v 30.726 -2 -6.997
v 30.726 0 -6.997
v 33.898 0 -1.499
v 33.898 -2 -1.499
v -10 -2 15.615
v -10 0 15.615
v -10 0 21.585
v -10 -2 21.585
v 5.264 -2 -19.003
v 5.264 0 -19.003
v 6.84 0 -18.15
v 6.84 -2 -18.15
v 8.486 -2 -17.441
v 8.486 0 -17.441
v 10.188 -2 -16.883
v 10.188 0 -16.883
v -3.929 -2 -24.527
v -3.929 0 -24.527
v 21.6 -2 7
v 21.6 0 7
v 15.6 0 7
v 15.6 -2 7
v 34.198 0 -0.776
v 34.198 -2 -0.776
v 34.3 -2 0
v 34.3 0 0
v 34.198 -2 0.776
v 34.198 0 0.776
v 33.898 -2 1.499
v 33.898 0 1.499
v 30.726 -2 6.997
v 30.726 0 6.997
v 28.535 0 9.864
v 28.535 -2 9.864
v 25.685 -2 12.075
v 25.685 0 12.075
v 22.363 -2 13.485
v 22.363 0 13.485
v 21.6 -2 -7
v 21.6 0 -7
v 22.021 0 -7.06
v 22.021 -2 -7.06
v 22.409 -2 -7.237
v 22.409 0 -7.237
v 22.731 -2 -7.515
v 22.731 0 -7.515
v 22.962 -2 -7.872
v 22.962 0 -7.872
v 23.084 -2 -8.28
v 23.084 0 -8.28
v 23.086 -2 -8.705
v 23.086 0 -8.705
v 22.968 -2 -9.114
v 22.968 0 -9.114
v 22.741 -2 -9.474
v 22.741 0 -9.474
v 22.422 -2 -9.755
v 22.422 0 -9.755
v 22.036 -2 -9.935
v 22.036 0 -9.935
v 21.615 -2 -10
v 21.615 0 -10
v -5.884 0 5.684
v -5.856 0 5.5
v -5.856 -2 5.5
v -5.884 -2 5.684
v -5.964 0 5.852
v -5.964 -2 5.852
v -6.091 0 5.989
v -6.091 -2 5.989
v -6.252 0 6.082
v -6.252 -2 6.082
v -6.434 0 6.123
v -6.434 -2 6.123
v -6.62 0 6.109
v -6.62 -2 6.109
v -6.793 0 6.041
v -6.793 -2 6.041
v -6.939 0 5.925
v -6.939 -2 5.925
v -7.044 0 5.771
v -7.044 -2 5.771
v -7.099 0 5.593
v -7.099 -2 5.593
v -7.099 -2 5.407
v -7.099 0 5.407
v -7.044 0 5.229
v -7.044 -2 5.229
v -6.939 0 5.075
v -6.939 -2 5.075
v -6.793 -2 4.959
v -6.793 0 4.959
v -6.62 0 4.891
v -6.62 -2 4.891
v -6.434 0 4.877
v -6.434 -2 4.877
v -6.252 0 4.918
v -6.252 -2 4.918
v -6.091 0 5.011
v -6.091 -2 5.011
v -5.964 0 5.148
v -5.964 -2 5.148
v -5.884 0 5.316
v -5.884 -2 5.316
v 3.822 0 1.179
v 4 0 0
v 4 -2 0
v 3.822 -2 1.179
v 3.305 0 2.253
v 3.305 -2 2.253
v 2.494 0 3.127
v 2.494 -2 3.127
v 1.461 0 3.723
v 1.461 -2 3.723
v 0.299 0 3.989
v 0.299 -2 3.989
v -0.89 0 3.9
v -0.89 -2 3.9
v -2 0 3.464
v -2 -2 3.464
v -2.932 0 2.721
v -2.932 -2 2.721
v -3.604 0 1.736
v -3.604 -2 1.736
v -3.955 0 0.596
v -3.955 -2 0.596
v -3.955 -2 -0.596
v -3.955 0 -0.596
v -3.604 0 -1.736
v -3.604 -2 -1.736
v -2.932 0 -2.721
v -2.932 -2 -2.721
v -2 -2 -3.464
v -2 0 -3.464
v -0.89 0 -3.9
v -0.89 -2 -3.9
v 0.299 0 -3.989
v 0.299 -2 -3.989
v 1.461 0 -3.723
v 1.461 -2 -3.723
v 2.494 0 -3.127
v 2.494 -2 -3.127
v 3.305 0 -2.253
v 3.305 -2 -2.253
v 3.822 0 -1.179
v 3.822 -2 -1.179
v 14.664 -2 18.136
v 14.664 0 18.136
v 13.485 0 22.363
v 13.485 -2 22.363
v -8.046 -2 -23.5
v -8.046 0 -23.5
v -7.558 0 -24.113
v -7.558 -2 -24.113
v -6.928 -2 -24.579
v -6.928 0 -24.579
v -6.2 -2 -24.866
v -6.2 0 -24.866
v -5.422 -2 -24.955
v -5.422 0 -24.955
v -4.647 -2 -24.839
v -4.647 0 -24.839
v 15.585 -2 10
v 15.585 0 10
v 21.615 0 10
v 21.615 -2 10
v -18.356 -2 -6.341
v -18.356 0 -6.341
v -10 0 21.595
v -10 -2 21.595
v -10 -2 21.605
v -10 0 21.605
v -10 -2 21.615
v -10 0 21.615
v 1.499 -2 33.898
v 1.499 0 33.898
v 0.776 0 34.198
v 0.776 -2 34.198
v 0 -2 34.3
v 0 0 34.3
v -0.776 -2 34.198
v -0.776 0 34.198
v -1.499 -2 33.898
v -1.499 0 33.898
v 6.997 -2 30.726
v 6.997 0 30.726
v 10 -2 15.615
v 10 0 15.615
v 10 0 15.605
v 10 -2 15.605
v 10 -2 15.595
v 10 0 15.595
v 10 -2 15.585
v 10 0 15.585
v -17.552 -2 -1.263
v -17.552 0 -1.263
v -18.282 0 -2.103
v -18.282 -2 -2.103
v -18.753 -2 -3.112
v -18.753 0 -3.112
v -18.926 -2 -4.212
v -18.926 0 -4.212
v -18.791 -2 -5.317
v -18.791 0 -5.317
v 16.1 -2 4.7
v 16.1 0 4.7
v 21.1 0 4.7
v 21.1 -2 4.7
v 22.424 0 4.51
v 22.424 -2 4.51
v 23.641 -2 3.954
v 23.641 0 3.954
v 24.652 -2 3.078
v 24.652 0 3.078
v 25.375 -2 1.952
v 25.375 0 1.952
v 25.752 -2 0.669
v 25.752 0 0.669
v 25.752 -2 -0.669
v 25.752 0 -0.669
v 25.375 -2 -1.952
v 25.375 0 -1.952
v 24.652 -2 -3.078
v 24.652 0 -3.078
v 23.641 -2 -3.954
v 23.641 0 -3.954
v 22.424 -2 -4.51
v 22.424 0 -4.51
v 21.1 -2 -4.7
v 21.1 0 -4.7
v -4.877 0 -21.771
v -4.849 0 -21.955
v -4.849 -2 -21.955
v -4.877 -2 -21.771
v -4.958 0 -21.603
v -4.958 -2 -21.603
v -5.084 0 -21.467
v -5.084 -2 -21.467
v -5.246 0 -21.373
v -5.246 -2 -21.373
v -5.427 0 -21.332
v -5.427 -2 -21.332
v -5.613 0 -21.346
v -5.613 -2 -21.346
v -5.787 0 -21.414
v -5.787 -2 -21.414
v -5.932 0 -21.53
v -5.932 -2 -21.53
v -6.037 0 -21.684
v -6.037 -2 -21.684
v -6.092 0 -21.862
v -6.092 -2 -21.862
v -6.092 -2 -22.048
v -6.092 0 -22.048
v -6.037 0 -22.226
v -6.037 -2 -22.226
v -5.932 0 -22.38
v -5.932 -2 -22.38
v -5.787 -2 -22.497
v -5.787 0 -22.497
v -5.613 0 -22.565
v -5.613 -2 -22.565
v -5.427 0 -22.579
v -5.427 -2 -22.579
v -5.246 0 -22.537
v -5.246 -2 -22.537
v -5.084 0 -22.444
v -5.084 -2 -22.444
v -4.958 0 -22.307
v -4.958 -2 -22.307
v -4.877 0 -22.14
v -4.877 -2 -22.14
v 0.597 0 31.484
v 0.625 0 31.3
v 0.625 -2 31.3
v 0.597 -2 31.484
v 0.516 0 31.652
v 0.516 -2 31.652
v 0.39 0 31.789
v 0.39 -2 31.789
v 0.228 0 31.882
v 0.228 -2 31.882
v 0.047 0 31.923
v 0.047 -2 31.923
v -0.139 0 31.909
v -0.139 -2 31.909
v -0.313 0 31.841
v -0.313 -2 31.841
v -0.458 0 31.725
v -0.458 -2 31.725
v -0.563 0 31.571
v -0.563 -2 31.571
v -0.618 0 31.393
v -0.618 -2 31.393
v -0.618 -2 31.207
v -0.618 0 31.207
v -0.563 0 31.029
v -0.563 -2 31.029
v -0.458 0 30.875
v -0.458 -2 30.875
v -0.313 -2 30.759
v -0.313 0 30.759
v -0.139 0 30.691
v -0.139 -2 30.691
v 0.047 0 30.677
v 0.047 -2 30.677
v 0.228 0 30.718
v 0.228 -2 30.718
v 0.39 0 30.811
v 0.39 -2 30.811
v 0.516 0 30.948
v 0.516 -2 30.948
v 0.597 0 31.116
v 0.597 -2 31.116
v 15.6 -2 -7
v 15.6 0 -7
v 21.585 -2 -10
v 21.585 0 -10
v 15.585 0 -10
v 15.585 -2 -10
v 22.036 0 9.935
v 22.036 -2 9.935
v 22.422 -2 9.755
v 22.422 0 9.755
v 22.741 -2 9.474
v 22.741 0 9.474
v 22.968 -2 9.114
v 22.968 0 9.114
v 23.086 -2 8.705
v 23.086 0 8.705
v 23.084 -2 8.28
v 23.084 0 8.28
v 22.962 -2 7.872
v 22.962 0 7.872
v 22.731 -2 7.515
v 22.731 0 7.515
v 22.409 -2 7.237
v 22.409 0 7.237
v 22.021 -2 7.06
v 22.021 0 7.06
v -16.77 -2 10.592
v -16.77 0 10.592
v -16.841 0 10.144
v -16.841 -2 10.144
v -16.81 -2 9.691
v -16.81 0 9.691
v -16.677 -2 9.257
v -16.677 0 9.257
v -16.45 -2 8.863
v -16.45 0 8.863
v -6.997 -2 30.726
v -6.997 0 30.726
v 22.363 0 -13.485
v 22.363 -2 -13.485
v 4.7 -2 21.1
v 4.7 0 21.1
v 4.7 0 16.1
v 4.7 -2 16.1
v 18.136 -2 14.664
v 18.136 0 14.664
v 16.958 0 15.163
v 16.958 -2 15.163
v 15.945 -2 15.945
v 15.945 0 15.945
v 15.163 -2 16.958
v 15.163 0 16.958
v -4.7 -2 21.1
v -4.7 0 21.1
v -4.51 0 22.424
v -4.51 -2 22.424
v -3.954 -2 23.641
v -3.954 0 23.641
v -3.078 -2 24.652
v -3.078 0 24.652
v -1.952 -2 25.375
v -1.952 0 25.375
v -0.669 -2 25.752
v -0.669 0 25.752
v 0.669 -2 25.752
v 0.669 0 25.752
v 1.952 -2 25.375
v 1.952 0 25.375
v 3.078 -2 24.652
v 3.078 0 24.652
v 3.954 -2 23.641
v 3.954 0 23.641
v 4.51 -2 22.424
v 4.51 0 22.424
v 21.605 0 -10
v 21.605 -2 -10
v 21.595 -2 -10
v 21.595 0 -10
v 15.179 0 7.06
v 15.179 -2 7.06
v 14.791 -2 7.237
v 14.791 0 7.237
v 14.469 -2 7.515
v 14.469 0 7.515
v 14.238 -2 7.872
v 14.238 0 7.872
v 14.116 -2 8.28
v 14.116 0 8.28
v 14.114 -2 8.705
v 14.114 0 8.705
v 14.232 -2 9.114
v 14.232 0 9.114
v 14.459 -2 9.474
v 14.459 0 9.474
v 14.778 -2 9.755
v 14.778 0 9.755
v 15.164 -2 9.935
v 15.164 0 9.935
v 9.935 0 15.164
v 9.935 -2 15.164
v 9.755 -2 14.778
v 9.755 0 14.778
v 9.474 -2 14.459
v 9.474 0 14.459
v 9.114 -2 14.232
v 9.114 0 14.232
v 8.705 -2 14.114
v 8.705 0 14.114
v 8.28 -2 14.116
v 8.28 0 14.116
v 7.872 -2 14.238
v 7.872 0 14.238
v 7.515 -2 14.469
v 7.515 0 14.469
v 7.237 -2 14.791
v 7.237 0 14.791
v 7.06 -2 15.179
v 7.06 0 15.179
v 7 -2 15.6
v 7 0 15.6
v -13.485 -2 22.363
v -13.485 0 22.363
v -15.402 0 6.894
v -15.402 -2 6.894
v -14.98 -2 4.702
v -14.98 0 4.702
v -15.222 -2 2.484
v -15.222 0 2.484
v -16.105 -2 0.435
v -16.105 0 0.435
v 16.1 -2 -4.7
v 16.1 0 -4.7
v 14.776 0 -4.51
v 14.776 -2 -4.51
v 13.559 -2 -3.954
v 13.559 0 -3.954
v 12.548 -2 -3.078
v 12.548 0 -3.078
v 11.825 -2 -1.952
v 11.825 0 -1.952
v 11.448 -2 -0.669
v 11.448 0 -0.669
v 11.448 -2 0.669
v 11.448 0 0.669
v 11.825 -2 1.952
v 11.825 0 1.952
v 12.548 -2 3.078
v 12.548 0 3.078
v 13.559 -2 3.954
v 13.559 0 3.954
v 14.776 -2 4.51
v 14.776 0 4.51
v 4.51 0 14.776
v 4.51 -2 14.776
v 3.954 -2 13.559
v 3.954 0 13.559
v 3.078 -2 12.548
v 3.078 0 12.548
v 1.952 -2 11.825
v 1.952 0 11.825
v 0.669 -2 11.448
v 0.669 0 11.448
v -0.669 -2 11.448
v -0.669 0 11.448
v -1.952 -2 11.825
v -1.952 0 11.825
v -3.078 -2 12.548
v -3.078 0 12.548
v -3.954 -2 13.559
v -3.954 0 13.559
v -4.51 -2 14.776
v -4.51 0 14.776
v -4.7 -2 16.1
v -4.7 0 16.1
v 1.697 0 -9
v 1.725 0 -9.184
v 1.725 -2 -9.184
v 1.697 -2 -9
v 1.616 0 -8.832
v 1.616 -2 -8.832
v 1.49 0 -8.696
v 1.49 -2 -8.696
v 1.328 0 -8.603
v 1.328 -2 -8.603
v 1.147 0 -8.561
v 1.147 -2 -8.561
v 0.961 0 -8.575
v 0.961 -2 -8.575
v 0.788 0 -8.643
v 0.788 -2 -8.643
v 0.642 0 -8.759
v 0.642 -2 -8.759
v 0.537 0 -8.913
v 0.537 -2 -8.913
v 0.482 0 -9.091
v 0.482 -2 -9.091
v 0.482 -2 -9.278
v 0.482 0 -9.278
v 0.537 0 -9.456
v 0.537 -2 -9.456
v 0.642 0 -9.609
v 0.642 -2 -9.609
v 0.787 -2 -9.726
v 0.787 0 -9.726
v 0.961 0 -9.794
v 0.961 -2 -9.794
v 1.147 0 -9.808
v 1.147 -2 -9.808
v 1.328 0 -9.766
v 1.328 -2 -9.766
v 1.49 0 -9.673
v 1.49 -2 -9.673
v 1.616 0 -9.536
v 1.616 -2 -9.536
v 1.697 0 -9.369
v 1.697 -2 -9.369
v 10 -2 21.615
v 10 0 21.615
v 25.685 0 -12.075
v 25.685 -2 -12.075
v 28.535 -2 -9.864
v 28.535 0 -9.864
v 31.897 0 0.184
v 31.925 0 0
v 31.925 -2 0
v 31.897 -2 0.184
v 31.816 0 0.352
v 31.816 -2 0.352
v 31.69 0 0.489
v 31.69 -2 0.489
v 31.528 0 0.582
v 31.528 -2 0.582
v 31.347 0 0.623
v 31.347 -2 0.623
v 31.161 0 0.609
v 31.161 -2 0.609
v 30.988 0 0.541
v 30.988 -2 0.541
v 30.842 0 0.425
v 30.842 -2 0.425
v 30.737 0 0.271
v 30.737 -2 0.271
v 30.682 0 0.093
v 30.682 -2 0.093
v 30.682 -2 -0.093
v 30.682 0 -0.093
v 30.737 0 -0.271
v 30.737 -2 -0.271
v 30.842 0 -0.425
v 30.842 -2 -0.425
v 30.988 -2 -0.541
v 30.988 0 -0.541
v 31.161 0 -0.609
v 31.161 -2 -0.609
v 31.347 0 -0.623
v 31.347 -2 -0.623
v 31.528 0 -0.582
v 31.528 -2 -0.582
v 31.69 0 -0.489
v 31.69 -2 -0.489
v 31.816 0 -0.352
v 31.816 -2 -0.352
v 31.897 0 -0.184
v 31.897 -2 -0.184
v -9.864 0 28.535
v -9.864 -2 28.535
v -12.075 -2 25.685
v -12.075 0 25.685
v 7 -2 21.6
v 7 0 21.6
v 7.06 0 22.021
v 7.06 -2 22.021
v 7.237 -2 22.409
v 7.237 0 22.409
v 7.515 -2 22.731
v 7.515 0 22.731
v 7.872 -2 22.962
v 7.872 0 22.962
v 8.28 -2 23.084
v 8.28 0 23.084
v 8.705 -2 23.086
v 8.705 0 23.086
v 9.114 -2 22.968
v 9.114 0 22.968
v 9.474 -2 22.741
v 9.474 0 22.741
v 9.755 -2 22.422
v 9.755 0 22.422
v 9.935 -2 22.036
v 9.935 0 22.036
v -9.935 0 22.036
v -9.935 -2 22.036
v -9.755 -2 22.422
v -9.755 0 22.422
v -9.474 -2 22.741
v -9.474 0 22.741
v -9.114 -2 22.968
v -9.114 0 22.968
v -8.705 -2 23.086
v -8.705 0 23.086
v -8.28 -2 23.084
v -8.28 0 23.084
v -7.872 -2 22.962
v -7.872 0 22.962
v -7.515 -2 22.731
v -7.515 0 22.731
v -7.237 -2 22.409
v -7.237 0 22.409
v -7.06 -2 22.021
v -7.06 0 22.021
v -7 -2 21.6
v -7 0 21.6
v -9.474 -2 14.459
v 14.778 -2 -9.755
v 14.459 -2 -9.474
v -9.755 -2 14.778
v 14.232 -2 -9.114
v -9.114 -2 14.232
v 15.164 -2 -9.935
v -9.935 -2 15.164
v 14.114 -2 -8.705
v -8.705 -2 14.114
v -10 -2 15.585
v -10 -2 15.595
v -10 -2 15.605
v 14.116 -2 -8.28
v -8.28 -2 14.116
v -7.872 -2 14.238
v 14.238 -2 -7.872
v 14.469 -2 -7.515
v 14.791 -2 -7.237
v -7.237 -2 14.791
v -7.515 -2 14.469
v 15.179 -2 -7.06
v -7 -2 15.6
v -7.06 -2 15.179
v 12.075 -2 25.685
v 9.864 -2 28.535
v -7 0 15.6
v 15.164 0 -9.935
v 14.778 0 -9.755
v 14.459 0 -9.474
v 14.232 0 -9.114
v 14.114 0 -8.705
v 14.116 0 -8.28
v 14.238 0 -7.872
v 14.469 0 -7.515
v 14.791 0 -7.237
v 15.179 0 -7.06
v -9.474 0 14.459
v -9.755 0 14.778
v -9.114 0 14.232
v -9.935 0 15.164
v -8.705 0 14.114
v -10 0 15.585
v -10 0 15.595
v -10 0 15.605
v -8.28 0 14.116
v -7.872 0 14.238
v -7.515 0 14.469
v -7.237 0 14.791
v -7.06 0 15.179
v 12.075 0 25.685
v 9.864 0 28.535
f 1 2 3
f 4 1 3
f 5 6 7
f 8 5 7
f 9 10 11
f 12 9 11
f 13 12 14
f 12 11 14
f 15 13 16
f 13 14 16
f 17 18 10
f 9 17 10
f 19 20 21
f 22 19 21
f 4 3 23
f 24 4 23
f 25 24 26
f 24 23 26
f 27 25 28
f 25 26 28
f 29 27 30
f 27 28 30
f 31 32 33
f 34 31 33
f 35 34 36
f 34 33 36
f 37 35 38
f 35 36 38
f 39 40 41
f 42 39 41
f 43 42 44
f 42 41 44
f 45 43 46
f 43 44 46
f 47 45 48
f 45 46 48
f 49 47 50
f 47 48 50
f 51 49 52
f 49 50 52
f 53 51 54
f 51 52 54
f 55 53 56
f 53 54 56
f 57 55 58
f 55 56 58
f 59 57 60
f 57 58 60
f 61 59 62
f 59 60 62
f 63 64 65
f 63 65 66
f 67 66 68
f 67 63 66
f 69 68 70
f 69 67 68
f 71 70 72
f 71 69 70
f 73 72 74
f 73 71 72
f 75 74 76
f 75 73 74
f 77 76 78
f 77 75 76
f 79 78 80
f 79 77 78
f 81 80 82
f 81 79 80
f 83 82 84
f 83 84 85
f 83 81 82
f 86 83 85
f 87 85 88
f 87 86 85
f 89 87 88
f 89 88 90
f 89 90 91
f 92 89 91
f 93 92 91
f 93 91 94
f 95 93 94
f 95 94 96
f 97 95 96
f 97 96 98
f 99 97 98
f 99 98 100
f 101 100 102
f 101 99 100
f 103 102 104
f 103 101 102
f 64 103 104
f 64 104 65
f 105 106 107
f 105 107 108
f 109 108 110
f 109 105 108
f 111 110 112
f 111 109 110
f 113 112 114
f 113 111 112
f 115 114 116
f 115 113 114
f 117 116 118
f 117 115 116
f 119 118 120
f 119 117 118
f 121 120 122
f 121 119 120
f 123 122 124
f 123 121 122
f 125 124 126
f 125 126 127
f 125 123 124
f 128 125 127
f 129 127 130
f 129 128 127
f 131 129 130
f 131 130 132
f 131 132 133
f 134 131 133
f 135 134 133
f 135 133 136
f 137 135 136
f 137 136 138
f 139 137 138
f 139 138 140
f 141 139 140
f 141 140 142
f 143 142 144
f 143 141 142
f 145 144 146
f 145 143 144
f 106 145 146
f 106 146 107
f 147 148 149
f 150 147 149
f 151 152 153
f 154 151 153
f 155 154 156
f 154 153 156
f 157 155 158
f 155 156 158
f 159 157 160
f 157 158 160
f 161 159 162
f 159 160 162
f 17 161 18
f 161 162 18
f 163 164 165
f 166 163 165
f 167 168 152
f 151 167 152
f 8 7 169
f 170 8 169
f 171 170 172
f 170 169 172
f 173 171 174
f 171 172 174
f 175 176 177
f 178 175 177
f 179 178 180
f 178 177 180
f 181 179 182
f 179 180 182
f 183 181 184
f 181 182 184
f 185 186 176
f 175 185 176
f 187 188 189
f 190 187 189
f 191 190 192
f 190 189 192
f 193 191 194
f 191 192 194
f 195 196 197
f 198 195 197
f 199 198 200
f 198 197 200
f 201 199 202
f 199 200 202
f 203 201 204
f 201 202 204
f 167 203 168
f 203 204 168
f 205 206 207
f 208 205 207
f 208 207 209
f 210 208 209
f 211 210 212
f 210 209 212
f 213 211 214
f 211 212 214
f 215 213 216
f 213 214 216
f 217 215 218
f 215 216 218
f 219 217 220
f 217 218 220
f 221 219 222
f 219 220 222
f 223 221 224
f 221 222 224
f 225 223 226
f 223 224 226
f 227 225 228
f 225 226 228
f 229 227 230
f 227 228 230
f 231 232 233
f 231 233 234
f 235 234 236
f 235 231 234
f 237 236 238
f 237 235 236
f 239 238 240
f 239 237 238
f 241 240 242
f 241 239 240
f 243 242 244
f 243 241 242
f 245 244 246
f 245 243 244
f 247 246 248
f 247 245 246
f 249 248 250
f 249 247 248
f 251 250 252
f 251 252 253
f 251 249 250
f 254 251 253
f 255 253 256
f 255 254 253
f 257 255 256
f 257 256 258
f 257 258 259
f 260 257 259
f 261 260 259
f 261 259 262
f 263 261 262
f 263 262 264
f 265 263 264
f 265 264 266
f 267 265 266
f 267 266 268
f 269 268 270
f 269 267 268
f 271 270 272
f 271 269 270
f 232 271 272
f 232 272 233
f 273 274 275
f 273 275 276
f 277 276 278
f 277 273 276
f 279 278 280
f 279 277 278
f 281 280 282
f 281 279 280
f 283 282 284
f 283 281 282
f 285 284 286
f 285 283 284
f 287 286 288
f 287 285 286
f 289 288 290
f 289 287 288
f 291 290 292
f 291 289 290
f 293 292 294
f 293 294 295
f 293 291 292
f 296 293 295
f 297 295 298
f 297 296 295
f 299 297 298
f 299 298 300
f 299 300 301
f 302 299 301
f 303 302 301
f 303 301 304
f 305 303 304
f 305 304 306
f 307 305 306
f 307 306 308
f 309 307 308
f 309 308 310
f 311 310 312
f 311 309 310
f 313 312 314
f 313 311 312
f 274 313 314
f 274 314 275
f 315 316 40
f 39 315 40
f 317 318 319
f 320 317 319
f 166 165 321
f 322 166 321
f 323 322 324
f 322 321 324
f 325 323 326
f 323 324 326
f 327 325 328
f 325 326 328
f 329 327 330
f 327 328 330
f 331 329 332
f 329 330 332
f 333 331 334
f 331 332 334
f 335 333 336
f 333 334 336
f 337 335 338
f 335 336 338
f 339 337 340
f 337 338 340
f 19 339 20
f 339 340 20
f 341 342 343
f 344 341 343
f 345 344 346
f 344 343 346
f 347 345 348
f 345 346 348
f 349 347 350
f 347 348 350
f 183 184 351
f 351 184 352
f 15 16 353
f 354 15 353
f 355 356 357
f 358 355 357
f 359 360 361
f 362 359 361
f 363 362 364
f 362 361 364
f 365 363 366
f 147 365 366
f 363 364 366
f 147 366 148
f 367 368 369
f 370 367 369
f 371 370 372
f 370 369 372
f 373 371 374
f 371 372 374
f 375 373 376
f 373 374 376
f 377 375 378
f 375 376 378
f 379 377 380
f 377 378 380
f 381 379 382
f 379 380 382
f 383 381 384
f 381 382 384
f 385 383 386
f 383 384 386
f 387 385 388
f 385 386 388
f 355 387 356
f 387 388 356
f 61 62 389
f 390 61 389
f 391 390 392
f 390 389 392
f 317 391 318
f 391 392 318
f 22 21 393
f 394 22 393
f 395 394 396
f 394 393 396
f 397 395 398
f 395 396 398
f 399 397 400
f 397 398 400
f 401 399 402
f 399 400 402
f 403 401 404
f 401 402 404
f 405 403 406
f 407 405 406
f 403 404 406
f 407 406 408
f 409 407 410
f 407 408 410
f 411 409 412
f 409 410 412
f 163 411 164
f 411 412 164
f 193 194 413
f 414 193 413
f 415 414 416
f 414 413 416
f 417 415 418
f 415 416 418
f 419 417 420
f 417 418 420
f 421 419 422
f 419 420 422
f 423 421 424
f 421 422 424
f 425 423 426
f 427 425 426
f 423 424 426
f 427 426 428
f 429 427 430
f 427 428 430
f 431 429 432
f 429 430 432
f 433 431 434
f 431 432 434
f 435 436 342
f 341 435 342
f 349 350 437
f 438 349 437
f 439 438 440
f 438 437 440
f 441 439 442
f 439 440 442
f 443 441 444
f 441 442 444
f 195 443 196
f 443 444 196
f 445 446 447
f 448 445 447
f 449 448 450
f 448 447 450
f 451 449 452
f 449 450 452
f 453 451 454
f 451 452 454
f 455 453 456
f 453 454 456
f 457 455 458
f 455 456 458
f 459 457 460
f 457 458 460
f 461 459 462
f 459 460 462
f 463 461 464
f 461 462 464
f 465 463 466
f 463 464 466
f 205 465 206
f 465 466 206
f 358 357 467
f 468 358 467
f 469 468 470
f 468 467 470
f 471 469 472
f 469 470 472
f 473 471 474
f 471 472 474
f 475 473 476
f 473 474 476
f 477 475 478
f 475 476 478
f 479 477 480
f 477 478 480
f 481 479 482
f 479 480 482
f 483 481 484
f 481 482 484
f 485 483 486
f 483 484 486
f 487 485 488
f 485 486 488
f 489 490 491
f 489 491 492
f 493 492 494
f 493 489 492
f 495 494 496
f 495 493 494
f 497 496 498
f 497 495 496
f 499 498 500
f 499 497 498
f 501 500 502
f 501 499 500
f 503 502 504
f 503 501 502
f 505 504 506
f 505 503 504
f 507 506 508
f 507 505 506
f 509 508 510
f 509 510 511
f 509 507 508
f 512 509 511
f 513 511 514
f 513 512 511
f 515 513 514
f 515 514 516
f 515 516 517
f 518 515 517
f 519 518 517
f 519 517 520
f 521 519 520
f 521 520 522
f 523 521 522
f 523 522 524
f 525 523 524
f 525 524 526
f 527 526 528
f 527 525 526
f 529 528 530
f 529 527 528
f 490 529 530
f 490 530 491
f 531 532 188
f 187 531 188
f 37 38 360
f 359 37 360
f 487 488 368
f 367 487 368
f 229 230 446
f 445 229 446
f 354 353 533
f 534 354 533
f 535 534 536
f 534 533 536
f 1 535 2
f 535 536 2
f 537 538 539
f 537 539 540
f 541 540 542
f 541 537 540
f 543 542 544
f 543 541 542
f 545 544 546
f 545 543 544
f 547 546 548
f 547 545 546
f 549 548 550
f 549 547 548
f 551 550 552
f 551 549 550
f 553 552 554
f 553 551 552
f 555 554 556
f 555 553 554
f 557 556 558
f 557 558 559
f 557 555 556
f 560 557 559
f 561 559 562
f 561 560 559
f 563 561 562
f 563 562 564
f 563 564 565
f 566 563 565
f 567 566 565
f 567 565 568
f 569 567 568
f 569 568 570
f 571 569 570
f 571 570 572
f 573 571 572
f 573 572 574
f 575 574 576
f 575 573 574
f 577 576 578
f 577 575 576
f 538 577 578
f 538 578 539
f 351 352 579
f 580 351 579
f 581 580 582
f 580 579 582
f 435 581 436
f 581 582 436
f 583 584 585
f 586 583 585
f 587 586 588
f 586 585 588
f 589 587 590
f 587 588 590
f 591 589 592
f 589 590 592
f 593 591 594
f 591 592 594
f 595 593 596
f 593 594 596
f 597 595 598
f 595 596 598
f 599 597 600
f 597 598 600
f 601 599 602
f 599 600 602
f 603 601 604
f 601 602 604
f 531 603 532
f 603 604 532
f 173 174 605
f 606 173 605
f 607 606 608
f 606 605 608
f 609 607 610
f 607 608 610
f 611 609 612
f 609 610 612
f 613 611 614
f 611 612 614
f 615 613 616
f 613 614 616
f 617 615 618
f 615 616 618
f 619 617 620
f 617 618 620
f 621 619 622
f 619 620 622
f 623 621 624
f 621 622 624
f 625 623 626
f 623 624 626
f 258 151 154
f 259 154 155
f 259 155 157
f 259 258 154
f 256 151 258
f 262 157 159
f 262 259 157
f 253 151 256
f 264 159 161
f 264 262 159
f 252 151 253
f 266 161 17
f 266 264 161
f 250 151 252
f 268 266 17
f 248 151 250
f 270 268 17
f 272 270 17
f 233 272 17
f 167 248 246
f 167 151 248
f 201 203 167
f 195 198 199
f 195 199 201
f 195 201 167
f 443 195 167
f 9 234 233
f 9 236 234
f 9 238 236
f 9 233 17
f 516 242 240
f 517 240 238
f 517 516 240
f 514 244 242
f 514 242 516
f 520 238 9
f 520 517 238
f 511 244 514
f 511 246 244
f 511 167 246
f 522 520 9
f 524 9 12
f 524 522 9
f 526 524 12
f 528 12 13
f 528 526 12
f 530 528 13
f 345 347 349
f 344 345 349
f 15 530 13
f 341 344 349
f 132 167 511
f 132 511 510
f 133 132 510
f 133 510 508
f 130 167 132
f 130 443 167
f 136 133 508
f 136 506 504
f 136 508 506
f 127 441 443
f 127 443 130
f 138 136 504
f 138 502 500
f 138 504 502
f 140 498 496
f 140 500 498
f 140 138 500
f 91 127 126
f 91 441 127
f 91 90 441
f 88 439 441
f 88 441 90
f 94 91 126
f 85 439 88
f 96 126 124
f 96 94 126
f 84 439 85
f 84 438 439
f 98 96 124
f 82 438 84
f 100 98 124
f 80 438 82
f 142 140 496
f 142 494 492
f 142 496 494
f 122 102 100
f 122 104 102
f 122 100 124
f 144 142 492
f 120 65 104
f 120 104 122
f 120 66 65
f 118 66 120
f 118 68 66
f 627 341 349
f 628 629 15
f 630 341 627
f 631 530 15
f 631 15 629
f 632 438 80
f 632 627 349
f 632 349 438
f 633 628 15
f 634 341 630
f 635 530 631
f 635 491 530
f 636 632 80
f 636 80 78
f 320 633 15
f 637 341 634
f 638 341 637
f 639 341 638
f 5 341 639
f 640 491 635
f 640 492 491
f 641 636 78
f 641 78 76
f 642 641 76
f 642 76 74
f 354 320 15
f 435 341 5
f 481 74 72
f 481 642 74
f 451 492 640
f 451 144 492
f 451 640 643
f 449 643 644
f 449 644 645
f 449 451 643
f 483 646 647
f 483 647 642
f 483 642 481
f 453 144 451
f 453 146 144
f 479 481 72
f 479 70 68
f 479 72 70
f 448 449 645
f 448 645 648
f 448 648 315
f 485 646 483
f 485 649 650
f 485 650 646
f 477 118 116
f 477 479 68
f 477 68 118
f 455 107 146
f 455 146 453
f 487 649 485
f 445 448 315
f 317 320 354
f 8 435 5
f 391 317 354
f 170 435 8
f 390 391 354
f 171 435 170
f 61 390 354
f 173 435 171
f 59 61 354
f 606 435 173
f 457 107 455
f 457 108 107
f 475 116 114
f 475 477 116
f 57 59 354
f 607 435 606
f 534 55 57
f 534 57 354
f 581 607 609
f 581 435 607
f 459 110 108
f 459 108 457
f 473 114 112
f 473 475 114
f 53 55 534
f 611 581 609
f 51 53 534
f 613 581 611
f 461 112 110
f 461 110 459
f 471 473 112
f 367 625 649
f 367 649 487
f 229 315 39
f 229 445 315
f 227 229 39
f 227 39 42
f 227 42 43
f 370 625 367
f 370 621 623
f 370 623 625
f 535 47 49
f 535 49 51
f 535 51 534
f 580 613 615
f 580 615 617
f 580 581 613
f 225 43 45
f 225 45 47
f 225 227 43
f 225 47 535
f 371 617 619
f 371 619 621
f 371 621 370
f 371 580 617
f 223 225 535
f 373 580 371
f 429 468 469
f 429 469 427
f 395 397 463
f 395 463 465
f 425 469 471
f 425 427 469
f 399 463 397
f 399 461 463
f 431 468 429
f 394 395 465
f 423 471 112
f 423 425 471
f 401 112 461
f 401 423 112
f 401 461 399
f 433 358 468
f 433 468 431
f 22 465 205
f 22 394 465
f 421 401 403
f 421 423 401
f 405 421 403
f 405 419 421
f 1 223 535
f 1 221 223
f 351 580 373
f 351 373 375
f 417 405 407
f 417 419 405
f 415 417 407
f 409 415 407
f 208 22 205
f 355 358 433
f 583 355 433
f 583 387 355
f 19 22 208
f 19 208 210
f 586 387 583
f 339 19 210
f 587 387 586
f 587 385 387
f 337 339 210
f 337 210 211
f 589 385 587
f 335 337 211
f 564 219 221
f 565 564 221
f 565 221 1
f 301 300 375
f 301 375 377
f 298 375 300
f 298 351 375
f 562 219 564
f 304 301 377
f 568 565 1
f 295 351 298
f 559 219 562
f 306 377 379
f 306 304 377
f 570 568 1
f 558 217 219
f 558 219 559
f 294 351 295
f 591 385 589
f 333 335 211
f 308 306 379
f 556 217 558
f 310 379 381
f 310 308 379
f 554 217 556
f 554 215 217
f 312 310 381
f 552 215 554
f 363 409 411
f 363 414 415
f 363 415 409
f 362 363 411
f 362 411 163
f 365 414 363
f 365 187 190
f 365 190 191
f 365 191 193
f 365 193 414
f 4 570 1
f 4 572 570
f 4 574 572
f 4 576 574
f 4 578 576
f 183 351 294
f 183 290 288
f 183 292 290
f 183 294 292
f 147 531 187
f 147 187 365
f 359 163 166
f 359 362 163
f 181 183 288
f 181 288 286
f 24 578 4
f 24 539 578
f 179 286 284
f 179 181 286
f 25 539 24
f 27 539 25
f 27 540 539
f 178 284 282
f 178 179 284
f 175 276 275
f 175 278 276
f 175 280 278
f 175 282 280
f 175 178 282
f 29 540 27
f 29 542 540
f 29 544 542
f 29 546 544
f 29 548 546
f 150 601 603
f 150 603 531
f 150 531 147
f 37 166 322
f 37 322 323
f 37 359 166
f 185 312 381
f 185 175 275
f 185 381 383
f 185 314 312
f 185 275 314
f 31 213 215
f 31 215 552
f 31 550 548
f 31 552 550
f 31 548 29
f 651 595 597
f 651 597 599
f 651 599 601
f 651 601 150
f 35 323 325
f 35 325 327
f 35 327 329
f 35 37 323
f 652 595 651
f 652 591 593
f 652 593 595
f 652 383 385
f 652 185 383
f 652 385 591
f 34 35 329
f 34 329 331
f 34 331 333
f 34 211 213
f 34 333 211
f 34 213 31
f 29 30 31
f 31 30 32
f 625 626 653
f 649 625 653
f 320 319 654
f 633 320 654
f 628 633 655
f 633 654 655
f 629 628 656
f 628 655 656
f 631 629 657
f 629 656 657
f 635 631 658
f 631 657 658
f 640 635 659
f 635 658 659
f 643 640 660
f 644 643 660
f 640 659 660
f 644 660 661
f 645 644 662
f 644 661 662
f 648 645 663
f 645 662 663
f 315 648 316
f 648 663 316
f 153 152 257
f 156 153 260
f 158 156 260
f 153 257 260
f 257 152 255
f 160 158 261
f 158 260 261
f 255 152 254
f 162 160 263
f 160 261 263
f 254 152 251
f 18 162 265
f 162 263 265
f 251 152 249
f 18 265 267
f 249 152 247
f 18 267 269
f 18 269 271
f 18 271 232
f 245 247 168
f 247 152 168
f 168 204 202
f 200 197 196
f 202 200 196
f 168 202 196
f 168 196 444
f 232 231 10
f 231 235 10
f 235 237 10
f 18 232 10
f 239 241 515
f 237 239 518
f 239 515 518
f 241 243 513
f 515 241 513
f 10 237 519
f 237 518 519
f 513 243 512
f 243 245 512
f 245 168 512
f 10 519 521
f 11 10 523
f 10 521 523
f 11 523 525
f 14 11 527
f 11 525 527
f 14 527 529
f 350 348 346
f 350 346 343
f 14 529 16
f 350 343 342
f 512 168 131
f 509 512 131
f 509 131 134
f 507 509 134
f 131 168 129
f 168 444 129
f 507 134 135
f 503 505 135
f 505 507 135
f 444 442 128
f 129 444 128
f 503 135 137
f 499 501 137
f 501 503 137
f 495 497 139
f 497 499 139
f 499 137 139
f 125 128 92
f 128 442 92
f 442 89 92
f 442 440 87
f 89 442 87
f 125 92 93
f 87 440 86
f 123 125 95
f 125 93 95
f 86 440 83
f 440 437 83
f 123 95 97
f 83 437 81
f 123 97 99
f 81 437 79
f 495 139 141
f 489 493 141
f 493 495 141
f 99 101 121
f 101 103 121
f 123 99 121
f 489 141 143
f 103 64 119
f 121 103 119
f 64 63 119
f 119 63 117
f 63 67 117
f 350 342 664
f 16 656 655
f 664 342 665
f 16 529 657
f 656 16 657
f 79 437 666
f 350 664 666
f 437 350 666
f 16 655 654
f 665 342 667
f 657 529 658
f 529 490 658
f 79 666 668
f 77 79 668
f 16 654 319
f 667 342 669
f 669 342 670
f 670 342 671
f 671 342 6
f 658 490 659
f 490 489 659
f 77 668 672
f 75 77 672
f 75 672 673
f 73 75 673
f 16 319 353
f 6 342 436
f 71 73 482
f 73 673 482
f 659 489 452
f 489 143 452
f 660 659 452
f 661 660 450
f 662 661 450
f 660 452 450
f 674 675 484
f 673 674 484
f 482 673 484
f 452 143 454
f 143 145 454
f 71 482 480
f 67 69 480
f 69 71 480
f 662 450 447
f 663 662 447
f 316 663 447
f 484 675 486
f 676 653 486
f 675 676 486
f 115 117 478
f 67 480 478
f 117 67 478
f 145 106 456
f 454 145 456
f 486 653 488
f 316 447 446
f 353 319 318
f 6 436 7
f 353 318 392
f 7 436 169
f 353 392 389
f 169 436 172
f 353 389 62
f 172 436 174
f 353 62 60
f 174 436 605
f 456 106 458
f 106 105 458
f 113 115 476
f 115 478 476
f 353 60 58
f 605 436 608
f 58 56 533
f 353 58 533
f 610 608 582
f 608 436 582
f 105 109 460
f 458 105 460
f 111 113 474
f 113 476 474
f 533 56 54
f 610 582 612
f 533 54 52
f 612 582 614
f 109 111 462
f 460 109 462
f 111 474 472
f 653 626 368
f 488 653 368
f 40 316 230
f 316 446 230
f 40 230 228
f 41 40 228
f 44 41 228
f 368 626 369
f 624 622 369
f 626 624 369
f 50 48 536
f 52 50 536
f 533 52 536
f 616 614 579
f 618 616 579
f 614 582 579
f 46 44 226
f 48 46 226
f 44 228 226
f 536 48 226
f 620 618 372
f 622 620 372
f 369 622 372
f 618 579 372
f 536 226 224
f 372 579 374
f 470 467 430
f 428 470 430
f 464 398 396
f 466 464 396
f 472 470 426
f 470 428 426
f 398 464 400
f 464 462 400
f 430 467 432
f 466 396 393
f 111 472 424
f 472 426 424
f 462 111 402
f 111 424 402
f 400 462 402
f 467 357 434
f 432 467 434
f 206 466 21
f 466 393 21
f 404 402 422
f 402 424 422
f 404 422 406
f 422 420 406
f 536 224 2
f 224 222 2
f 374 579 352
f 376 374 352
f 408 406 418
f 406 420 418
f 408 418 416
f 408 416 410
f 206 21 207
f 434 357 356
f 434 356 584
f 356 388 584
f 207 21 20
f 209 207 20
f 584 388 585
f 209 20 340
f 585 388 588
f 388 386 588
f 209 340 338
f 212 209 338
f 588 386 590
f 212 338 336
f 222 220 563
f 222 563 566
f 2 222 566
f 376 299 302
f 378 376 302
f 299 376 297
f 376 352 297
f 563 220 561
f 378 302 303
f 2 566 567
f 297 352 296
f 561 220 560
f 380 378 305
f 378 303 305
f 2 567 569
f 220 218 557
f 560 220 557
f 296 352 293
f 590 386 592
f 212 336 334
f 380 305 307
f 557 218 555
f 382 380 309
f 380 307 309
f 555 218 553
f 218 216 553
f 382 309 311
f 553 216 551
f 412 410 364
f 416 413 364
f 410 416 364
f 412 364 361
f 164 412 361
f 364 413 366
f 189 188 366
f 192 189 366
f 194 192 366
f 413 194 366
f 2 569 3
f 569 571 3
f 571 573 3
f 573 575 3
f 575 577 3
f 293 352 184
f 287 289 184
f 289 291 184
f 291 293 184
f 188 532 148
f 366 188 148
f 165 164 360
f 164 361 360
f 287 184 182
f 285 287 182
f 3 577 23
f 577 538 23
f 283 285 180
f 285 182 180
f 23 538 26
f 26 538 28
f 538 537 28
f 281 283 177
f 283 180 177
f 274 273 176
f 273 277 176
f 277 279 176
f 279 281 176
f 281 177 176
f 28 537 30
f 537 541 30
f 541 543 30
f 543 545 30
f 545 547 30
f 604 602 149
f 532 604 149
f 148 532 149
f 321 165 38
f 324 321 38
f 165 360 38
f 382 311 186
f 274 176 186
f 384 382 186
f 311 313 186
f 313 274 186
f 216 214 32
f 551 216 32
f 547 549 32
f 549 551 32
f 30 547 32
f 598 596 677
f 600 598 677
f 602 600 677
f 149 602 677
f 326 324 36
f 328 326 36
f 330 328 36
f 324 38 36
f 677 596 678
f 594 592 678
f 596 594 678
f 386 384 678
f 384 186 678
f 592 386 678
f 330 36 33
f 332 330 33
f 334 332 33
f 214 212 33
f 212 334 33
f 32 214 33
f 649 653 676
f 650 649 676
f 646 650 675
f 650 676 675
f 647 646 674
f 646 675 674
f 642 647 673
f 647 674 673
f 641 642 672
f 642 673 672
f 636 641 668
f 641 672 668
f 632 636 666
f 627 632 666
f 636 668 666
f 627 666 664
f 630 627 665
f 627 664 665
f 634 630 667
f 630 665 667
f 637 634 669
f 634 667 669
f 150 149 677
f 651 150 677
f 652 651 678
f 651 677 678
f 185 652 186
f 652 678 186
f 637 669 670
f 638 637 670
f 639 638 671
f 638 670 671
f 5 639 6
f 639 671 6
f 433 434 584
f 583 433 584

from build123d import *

# Parameters (mm, degrees)
F0_R     = 0.625
F0_R_2   = 4
F1_DEPTH = 2


with BuildPart() as f1:
    # F0 (on Front) → F1 (new body)
    with BuildSketch(Plane.XZ):
        with BuildLine():
            ThreePointArc((-17.552148, -1.263062), (-18.877937, -3.655988), (-18.355769, -6.341347))
            Line((-18.355769, -6.341347), (-8.04557, -23.5004))
            ThreePointArc((-8.04557, -23.5004), (-6.199833, -24.866173), (-3.928953, -24.526788))
            Line((-3.928953, -24.526788), (5.264061, -19.003068))
            ThreePointArc((5.264061, -19.003068), (7.654891, -17.777065), (10.188478, -16.882589))
            Line((10.188478, -16.882589), (22.363441, -13.484677))
            ThreePointArc((22.363441, -13.484677), (27.181397, -11.061629), (30.725984, -6.997178))
            Line((30.725984, -6.997178), (33.898425, -1.499395))
            ThreePointArc((33.898425, -1.499395), (34.3, 0), (33.898425, 1.499395))
            Line((33.898425, 1.499395), (30.725984, 6.997178))
            ThreePointArc((30.725984, 6.997178), (27.181397, 11.061629), (22.363441, 13.484677))
            Line((22.363441, 13.484677), (18.1363, 14.66443))
            ThreePointArc((18.1363, 14.66443), (15.944852, 15.944852), (14.66443, 18.1363))
            Line((14.66443, 18.1363), (13.484677, 22.363441))
            ThreePointArc((13.484677, 22.363441), (11.061629, 27.181397), (6.997178, 30.725984))
            Line((6.997178, 30.725984), (1.499395, 33.898425))
            ThreePointArc((1.499395, 33.898425), (0, 34.3), (-1.499395, 33.898425))
            Line((-1.499395, 33.898425), (-6.997178, 30.725984))
            ThreePointArc((-6.997178, 30.725984), (-11.061629, 27.181397), (-13.484677, 22.363441))
            Line((-13.484677, 22.363441), (-16.76984, 10.592467))
            ThreePointArc((-16.76984, 10.592467), (-16.810073, 9.690932), (-16.449911, 8.863486))
            ThreePointArc((-16.449911, 8.863486), (-15.01815, 3.584383), (-17.552148, -1.263062))
        make_face()
        with Locations((-5.474068, -21.955286)):
            Circle(F0_R, mode=Mode.SUBTRACT)
        with Locations((1.1, -9.184362)):
            Circle(F0_R, mode=Mode.SUBTRACT)
        Circle(F0_R_2, mode=Mode.SUBTRACT)
        with BuildLine():
            Line((18.6, -7), (21.6, -7))
            ThreePointArc((21.6, -7), (23.09998, -8.492292), (21.615416, -9.999921))
            ThreePointArc((21.615416, -9.999921), (21.6, -10), (21.584584, -9.999921))
            Line((21.584584, -9.999921), (18.6, -9.999921))
            Line((18.6, -9.999921), (15.615416, -9.999921))
            Line((15.615416, -9.999921), (15.584584, -9.999921))
            ThreePointArc((15.584584, -9.999921), (14.10002, -8.492292), (15.6, -7))
            Line((15.6, -7), (18.6, -7))
        make_face(mode=Mode.SUBTRACT)
        with BuildLine():
            ThreePointArc((16.1, -4.7), (11.4, 0), (16.1, 4.7))
            Line((16.1, 4.7), (21.1, 4.7))
            ThreePointArc((21.1, 4.7), (25.8, 0), (21.1, -4.7))
            Line((21.1, -4.7), (16.1, -4.7))
        make_face(mode=Mode.SUBTRACT)
        with Locations((31.3, 0)):
            Circle(F0_R, mode=Mode.SUBTRACT)
        with Locations((-6.480741, 5.5)):
            Circle(F0_R, mode=Mode.SUBTRACT)
        with BuildLine():
            ThreePointArc((-9.999921, 21.615416), (-8.492292, 23.09998), (-7, 21.6))
            Line((-7, 21.6), (-7, 18.6))
            Line((-7, 18.6), (-7, 15.6))
            ThreePointArc((-7, 15.6), (-8.492292, 14.10002), (-9.999921, 15.584584))
            ThreePointArc((-9.999921, 15.584584), (-10, 15.6), (-9.999921, 15.615416))
            Line((-9.999921, 15.615416), (-9.999921, 18.6))
            Line((-9.999921, 18.6), (-9.999921, 21.584584))
            ThreePointArc((-9.999921, 21.584584), (-10, 21.6), (-9.999921, 21.615416))
        make_face(mode=Mode.SUBTRACT)
        with BuildLine():
            ThreePointArc((4.7, 16.1), (0, 11.4), (-4.7, 16.1))
            Line((-4.7, 16.1), (-4.7, 21.1))
            ThreePointArc((-4.7, 21.1), (0, 25.8), (4.7, 21.1))
            Line((4.7, 21.1), (4.7, 16.1))
        make_face(mode=Mode.SUBTRACT)
        with Locations((0, 31.3)):
            Circle(F0_R, mode=Mode.SUBTRACT)
        with BuildLine():
            Line((21.584584, 9.999921), (21.615416, 9.999921))
            ThreePointArc((21.615416, 9.999921), (23.09998, 8.492292), (21.6, 7))
            Line((21.6, 7), (18.6, 7))
            Line((18.6, 7), (15.6, 7))
            ThreePointArc((15.6, 7), (14.10002, 8.492292), (15.584584, 9.999921))
            Line((15.584584, 9.999921), (15.615416, 9.999921))
            Line((15.615416, 9.999921), (18.6, 9.999921))
            Line((18.6, 9.999921), (21.584584, 9.999921))
        make_face(mode=Mode.SUBTRACT)
        with BuildLine():
            ThreePointArc((9.999921, 15.584584), (8.492292, 14.10002), (7, 15.6))
            Line((7, 15.6), (7, 18.6))
            Line((7, 18.6), (7, 21.6))
            ThreePointArc((7, 21.6), (8.492292, 23.09998), (9.999921, 21.615416))
            Line((9.999921, 21.615416), (9.999921, 21.584584))
            Line((9.999921, 21.584584), (9.999921, 18.6))
            Line((9.999921, 18.6), (9.999921, 15.615416))
            ThreePointArc((9.999921, 15.615416), (10, 15.6), (9.999921, 15.584584))
        make_face(mode=Mode.SUBTRACT)
    extrude(amount=F1_DEPTH)


solid = f1.part
